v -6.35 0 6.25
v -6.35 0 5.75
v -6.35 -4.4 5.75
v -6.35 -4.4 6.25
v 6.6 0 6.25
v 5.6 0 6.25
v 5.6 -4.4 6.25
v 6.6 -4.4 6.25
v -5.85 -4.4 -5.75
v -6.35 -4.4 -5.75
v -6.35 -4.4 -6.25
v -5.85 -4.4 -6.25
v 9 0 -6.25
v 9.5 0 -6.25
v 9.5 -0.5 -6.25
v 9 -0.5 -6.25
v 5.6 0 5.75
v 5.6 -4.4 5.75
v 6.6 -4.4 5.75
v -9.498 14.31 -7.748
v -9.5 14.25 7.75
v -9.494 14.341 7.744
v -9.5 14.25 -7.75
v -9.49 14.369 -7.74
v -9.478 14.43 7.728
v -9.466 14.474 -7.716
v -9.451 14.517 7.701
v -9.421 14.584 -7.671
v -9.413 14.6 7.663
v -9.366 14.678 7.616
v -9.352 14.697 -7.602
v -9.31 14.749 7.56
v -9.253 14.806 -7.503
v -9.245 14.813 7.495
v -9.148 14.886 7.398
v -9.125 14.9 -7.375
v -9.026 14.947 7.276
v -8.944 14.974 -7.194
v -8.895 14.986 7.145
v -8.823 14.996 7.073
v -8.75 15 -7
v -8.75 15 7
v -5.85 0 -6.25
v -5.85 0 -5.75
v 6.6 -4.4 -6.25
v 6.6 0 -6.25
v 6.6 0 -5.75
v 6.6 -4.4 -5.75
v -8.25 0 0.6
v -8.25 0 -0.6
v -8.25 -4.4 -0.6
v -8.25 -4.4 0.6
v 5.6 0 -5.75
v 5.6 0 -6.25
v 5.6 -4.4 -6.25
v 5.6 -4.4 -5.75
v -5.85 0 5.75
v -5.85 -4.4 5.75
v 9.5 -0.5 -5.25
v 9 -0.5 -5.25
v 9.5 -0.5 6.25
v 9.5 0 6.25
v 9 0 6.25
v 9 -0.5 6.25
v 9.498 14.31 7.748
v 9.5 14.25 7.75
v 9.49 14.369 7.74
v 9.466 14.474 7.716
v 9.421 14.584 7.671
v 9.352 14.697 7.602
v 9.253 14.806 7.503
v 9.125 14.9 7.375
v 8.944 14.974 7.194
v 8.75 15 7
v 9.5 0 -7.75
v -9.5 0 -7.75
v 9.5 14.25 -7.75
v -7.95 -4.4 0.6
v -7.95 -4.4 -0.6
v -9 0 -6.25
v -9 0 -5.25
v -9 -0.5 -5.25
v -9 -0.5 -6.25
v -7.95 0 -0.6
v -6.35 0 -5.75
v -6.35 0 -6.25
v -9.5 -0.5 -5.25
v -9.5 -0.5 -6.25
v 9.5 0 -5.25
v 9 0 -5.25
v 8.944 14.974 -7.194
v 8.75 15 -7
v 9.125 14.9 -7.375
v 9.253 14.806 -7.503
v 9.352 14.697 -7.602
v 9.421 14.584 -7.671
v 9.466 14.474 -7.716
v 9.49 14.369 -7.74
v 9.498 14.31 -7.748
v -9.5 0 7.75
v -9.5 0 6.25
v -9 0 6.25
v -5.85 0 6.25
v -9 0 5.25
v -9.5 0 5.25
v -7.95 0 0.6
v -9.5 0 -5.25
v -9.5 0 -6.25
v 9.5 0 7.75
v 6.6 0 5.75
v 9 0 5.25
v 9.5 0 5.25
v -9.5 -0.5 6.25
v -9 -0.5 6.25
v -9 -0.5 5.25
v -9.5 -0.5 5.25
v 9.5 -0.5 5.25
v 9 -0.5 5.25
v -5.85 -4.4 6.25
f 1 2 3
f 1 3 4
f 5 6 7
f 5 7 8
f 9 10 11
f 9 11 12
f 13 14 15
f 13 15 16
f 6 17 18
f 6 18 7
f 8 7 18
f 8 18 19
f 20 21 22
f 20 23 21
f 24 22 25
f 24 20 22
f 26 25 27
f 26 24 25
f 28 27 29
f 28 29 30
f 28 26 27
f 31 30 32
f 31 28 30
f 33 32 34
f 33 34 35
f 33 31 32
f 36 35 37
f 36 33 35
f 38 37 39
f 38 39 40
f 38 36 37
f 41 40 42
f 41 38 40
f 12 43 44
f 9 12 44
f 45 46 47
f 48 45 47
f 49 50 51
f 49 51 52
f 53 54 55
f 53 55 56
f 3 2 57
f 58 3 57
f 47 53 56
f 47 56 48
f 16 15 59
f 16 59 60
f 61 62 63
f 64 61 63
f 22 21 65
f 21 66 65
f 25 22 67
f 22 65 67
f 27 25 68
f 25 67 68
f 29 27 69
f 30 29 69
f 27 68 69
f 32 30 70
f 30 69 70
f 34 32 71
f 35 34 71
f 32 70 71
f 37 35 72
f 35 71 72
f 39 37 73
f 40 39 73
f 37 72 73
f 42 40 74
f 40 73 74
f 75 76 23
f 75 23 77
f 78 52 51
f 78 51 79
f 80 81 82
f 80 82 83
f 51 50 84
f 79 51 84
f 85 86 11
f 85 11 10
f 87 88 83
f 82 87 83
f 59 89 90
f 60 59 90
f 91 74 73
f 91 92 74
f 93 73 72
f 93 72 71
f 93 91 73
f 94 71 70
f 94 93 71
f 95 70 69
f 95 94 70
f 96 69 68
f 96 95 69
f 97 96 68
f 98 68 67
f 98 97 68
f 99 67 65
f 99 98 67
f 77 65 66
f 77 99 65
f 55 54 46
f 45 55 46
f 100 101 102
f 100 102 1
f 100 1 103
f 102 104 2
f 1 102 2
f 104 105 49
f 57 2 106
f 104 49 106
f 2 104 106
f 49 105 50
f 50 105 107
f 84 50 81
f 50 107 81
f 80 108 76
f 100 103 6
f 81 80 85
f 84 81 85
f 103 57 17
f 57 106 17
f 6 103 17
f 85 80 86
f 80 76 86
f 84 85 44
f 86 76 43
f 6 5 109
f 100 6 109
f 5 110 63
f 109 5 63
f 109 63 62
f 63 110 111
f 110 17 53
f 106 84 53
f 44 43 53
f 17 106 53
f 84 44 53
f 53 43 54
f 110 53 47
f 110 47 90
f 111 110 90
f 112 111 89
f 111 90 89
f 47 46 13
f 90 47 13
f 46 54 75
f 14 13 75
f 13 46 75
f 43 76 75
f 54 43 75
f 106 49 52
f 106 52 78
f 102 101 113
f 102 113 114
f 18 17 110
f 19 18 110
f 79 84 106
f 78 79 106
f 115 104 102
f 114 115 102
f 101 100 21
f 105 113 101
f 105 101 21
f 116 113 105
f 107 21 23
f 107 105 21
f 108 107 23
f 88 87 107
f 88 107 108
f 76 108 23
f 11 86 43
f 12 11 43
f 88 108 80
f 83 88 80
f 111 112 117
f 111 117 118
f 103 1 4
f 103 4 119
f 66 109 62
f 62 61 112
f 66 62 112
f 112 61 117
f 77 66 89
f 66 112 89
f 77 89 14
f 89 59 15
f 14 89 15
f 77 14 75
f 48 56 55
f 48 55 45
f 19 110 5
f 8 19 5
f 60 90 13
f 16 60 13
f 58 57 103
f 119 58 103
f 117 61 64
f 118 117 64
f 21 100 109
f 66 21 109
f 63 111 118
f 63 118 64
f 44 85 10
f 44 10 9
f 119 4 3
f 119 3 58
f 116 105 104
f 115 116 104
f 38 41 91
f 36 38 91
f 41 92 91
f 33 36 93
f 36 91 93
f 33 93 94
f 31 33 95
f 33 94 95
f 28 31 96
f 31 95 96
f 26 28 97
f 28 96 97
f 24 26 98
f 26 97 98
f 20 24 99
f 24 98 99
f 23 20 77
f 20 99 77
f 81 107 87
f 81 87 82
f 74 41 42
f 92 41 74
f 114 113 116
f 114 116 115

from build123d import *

# Parameters (mm, degrees)
SKETCH1_W                         = 19
SKETCH1_H                         = 15.5
BASE_EXTRUSION_DEPTH              = 15
SKETCH2_W                         = 0.3
SKETCH2_H                         = 1.2
SKETCH2_W_2                       = 0.5
SKETCH2_H_2                       = 0.5
SKETCH2_W_3                       = 1
PINS_DEPTH                        = 4.4
SKETCH3_W                         = 0.5
SKETCH3_H                         = 1
STANDOFF_DEPTH                    = 0.5
STANDOFF_MIRROR_2_COPY_1_SKETCH_W = 0.5
STANDOFF_MIRROR_2_COPY_1_SKETCH_H = 1
STANDOFF_MIRROR_2_COPY_1_DEPTH    = 0.5
TOP_EDGE_ROUNDS_R                 = 0.75


with BuildPart() as part:
    # Sketch1 → Base Extrusion (new body)
    with BuildSketch(Plane(origin=(0, 0, 0), x_dir=(1, 0, 0), z_dir=(0, 1, 0))):
        Rectangle(SKETCH1_W, SKETCH1_H)
    extrude(amount=BASE_EXTRUSION_DEPTH)

    # Sketch2 → Pins (add)
    with BuildSketch(Plane.XZ):
        with Locations((-8.1, 0)):
            Rectangle(SKETCH2_W, SKETCH2_H)
        with Locations((-6.1, -6)):
            Rectangle(SKETCH2_W_2, SKETCH2_H_2)
        with Locations((-6.1, 6)):
            Rectangle(SKETCH2_W_2, SKETCH2_H_2)
        with Locations((6.1, 6)):
            Rectangle(SKETCH2_W_3, SKETCH2_H_2)
        with Locations((6.1, -6)):
            Rectangle(SKETCH2_W_3, SKETCH2_H_2)
    extrude(amount=PINS_DEPTH)

    # Sketch3 → Standoff (add)
    with BuildSketch(Plane.XZ):
        with Locations((-9.25, 5.75)):
            Rectangle(SKETCH3_W, SKETCH3_H)
    standoff = extrude(amount=STANDOFF_DEPTH)

    # Standoff Mirror: Standoff across plane
    add(standoff.mirror(Plane.XY))

    # Standoff Mirror 2: Standoff across plane
    add(standoff.mirror(Plane(origin=(0, 0, 0), x_dir=(0, 0, 1), z_dir=(1, 0, 0))))

    # Standoff Mirror 2 copy 1 sketch → Standoff Mirror 2 copy 1 (add)
    with BuildSketch(Plane(origin=(0, 0, 0), x_dir=(-1, 0, 0), z_dir=(0, -1, 0))):
        with Locations((-9.25, 5.75)):
            Rectangle(STANDOFF_MIRROR_2_COPY_1_SKETCH_W, STANDOFF_MIRROR_2_COPY_1_SKETCH_H)
    extrude(amount=STANDOFF_MIRROR_2_COPY_1_DEPTH)

    # Top Edge Rounds
    top_edge_rounds_edges = [part.edges().sort_by_distance(p)[0] for p in [
        (9.5, 15, 0),
        (0, 15, -7.75),
        (-9.5, 15, 0),
        (0, 15, 7.75),
    ]]
    fillet(top_edge_rounds_edges, radius=TOP_EDGE_ROUNDS_R)


solid = part.part
